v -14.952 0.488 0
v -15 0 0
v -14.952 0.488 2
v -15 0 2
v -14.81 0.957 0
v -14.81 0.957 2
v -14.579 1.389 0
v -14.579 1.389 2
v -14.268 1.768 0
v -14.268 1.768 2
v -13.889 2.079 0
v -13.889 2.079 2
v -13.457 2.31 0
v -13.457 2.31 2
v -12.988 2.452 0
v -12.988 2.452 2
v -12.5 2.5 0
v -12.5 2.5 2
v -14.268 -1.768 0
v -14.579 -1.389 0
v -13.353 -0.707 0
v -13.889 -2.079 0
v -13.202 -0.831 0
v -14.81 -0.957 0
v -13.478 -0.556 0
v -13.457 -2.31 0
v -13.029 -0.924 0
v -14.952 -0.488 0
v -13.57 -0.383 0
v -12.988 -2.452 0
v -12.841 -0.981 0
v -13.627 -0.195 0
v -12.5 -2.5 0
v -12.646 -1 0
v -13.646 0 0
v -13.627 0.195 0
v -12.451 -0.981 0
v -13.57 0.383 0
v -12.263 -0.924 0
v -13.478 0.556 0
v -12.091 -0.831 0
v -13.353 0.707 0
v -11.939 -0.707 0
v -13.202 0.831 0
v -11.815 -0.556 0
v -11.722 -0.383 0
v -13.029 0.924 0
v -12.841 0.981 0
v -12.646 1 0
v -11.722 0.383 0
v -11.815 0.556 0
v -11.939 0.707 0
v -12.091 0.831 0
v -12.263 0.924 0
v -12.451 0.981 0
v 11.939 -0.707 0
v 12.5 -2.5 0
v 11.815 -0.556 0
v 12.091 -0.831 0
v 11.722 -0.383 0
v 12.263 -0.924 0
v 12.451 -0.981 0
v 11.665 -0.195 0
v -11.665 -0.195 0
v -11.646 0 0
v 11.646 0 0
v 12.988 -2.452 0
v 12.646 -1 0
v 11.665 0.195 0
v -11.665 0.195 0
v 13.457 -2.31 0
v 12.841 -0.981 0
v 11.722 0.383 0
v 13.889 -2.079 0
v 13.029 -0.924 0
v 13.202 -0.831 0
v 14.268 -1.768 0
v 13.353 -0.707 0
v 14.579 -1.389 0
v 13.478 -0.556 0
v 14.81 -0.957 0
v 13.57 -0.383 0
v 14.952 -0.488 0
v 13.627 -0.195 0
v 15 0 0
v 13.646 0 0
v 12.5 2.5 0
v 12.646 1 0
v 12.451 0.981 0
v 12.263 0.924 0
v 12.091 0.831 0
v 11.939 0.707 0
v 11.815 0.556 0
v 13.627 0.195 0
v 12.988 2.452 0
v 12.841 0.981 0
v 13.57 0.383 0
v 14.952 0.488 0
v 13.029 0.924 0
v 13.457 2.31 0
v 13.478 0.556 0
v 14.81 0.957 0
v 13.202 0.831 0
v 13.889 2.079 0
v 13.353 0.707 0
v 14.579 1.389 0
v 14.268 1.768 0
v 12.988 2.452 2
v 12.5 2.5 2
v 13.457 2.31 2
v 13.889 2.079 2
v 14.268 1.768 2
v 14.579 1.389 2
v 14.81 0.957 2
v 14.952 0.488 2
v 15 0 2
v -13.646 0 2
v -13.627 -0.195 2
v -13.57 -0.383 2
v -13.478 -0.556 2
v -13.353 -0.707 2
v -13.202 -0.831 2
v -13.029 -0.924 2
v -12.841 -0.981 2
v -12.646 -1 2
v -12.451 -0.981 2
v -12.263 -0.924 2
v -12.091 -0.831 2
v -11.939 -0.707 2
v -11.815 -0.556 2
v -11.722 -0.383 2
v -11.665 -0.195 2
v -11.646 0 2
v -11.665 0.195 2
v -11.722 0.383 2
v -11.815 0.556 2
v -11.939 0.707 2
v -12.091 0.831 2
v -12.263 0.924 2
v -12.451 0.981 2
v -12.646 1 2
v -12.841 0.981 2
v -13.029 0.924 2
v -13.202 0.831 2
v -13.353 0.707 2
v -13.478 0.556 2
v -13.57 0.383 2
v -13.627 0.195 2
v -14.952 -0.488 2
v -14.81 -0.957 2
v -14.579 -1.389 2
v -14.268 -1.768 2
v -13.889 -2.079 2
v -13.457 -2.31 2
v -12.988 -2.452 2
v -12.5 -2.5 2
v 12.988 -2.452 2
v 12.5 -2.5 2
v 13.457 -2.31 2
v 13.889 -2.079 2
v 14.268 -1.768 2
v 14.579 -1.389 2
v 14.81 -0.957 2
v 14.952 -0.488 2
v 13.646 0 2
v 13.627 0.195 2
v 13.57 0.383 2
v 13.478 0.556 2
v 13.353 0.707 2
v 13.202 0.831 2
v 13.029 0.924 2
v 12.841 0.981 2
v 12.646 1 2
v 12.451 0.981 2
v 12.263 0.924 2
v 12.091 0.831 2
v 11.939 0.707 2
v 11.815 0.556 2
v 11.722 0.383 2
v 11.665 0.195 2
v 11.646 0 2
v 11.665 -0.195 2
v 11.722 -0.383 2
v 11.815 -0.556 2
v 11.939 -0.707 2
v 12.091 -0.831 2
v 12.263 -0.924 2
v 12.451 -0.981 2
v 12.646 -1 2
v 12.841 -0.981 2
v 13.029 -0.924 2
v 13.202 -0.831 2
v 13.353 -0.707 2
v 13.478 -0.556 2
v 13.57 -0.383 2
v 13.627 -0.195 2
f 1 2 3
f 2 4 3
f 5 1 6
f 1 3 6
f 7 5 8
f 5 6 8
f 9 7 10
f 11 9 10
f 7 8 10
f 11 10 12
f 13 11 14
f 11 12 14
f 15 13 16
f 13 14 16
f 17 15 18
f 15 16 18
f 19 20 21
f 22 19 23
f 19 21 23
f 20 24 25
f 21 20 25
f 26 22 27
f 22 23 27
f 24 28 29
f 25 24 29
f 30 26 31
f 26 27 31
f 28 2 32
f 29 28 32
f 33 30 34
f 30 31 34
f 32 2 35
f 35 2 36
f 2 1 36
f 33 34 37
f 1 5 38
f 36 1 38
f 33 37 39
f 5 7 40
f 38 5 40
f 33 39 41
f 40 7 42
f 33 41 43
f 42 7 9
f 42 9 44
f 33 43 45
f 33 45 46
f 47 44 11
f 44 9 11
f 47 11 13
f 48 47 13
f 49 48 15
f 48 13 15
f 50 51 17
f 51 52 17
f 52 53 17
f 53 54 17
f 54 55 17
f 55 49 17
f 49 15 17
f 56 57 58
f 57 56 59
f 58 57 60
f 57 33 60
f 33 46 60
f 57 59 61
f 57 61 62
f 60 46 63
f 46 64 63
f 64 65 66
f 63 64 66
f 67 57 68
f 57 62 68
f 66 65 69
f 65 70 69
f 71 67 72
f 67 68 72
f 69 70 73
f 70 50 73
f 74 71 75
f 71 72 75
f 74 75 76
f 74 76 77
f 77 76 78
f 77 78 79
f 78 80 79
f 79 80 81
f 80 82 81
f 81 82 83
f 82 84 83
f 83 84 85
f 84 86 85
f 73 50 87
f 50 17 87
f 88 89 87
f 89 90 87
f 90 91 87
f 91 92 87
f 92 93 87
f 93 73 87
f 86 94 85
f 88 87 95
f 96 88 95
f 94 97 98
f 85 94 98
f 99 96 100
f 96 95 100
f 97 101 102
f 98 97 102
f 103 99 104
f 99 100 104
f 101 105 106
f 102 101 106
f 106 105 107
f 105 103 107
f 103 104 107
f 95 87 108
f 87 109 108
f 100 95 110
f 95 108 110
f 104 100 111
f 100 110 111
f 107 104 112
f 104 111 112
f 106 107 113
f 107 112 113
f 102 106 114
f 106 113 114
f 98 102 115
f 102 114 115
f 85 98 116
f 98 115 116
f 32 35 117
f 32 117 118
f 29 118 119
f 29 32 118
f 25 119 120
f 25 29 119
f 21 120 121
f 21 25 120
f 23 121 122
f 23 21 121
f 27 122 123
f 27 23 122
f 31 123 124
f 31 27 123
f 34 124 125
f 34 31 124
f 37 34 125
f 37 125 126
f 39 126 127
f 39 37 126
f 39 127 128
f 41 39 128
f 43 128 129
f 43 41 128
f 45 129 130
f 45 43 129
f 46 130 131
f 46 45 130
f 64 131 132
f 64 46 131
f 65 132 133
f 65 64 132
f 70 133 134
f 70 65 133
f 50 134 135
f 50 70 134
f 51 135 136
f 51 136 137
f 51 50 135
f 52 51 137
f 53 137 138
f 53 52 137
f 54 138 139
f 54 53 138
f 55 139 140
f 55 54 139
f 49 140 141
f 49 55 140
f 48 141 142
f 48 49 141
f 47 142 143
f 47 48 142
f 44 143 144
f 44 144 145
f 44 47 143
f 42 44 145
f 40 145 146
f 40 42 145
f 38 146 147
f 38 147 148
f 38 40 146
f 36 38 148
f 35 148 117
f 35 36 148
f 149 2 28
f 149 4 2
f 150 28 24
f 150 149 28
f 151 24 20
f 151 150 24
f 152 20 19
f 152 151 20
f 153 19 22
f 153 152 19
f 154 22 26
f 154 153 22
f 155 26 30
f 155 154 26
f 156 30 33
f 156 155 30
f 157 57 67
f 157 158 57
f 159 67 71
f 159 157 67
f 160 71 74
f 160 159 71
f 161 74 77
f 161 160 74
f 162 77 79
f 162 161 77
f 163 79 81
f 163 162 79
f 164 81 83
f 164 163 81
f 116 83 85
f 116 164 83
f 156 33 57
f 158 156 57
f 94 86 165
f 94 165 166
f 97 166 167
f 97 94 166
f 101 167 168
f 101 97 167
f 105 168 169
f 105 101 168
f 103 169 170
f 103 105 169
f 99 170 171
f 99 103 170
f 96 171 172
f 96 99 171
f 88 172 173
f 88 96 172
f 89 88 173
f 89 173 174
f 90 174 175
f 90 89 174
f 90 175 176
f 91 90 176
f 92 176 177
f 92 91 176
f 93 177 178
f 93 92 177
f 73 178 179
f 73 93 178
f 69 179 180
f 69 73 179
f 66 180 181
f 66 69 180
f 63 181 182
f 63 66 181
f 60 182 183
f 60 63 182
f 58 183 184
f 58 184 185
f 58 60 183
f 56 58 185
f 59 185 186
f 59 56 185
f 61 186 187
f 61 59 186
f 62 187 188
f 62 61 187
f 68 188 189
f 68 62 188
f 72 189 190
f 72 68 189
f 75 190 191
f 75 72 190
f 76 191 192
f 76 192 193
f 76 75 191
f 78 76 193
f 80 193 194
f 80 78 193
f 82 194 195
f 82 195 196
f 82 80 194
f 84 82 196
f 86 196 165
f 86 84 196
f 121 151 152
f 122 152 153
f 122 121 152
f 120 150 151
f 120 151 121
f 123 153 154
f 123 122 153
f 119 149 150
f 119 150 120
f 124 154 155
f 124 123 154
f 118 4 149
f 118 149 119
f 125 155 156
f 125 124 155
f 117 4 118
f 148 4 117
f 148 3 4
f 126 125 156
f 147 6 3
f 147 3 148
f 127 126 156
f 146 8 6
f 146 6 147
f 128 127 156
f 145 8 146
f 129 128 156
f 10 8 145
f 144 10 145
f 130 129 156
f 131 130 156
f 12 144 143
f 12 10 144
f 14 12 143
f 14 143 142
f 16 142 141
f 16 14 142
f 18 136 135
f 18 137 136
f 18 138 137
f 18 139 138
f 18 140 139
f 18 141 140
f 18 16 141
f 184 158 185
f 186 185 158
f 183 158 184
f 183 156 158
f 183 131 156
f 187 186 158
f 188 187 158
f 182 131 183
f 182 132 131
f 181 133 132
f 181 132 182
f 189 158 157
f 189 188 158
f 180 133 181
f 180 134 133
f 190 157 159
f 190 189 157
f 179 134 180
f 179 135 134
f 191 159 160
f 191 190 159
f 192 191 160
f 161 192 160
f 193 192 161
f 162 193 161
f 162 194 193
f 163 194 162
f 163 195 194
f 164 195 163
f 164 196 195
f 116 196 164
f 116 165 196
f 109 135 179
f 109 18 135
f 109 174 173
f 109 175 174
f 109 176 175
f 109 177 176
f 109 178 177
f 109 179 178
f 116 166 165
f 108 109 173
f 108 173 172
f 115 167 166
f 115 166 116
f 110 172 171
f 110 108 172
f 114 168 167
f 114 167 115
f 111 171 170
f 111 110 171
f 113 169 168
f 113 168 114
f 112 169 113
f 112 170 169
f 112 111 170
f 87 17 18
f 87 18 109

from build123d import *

# Parameters (mm, degrees)
SKETCH1_W           = 30
SKETCH1_H           = 5
SKETCH1_R           = 1
BOSS_EXTRUDE1_DEPTH = 2
FILLET1_R           = 2.5


with BuildPart() as part:
    # Sketch1 → Boss-Extrude1 (new body)
    with BuildSketch(Plane.XY):
        Rectangle(SKETCH1_W, SKETCH1_H)
        with Locations((12.646126356, 0)):
            Circle(SKETCH1_R, mode=Mode.SUBTRACT)
        with Locations(Location((-12.646126356, 0, 0), (0, 0, 180))):
            Circle(SKETCH1_R, mode=Mode.SUBTRACT)
    extrude(amount=BOSS_EXTRUDE1_DEPTH)

    # Fillet1
    fillet1_edges = [part.edges().sort_by_distance(p)[0] for p in [
        (-15, -2.5, 1),
        (-15, 2.5, 1),
        (15, -2.5, 1),
        (15, 2.5, 1),
    ]]
    fillet(fillet1_edges, radius=FILLET1_R - 0.0001)  # a hair under: the kernel refuses the full size


solid = part.part
